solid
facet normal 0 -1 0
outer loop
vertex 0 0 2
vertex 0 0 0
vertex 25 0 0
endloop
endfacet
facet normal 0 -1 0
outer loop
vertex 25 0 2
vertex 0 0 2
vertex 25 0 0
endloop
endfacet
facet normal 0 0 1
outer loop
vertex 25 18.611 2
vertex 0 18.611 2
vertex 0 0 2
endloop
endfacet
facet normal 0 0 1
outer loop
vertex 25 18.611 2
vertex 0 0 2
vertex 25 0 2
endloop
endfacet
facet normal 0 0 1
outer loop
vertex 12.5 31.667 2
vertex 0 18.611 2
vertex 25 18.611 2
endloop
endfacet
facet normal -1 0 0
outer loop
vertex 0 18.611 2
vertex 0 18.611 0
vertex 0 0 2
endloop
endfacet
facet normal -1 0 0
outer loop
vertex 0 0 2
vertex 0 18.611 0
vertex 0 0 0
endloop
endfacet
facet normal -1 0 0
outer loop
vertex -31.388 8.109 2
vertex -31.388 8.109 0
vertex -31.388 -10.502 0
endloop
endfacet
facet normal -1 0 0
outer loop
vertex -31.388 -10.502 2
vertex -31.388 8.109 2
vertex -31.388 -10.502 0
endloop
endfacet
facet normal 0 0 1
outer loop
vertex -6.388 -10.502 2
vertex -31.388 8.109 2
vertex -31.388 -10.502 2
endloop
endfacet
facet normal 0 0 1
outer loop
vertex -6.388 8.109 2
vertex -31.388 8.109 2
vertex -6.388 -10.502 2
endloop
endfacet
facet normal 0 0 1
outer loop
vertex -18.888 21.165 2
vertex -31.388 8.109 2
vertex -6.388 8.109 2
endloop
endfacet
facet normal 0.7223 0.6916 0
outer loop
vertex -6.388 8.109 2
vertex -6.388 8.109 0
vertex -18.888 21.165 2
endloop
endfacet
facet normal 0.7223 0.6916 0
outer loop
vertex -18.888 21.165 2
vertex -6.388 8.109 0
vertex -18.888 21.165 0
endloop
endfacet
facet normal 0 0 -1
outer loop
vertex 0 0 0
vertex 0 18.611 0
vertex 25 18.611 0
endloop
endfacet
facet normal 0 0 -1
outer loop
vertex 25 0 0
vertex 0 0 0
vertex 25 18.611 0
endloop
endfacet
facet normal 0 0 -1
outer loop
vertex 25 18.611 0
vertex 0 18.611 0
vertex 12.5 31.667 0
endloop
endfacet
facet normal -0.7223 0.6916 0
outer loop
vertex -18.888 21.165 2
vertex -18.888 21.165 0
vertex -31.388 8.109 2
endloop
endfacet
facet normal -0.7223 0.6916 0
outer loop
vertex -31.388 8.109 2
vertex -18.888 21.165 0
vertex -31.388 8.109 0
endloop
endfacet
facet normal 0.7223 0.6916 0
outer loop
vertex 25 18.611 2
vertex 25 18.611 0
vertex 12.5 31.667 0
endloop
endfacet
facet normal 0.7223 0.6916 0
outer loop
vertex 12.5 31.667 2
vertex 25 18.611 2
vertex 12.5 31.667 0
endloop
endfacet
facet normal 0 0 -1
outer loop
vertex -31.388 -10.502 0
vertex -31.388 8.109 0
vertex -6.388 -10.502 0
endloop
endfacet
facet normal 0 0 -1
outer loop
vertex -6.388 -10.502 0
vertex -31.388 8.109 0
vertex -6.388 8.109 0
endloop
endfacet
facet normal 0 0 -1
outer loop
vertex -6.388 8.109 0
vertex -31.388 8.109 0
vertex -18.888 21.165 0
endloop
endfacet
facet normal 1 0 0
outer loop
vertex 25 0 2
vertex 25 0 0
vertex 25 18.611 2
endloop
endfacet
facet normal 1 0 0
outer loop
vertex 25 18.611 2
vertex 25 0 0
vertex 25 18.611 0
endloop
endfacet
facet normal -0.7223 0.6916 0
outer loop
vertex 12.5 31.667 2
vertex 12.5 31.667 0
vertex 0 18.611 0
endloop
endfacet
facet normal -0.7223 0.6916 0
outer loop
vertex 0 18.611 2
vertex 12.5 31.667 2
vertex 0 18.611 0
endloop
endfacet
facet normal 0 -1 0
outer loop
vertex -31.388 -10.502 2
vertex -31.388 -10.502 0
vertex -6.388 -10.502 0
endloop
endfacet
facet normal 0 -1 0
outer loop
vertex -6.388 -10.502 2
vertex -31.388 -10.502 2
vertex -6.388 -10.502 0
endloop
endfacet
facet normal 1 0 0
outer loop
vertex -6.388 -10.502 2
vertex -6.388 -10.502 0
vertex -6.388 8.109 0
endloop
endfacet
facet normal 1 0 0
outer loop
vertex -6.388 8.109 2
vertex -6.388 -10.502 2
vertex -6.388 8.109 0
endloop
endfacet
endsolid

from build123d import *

# Parameters (mm, degrees)
F1_DEPTH = 2
F3_DEPTH = 2


with BuildPart() as f1:
    # F0 (on Top) → F1 (new body)
    with BuildSketch(Plane.XY):
        Polygon((-18.887816, 21.164571), (-31.387816, 8.109015), (-31.387816, -10.502097), (-6.387816, -10.502097), (-6.387816, 8.109015), align=None)
    extrude(amount=F1_DEPTH)


with BuildPart() as f3:
    # F2 (on Top) → F3 (new body)
    with BuildSketch(Plane.XY):
        Polygon((0, 18.611), (0, 0), (25, 0), (25, 18.611), (12.5, 31.666866), align=None)
    extrude(amount=F3_DEPTH)


solid = Compound([f1.part, f3.part])
